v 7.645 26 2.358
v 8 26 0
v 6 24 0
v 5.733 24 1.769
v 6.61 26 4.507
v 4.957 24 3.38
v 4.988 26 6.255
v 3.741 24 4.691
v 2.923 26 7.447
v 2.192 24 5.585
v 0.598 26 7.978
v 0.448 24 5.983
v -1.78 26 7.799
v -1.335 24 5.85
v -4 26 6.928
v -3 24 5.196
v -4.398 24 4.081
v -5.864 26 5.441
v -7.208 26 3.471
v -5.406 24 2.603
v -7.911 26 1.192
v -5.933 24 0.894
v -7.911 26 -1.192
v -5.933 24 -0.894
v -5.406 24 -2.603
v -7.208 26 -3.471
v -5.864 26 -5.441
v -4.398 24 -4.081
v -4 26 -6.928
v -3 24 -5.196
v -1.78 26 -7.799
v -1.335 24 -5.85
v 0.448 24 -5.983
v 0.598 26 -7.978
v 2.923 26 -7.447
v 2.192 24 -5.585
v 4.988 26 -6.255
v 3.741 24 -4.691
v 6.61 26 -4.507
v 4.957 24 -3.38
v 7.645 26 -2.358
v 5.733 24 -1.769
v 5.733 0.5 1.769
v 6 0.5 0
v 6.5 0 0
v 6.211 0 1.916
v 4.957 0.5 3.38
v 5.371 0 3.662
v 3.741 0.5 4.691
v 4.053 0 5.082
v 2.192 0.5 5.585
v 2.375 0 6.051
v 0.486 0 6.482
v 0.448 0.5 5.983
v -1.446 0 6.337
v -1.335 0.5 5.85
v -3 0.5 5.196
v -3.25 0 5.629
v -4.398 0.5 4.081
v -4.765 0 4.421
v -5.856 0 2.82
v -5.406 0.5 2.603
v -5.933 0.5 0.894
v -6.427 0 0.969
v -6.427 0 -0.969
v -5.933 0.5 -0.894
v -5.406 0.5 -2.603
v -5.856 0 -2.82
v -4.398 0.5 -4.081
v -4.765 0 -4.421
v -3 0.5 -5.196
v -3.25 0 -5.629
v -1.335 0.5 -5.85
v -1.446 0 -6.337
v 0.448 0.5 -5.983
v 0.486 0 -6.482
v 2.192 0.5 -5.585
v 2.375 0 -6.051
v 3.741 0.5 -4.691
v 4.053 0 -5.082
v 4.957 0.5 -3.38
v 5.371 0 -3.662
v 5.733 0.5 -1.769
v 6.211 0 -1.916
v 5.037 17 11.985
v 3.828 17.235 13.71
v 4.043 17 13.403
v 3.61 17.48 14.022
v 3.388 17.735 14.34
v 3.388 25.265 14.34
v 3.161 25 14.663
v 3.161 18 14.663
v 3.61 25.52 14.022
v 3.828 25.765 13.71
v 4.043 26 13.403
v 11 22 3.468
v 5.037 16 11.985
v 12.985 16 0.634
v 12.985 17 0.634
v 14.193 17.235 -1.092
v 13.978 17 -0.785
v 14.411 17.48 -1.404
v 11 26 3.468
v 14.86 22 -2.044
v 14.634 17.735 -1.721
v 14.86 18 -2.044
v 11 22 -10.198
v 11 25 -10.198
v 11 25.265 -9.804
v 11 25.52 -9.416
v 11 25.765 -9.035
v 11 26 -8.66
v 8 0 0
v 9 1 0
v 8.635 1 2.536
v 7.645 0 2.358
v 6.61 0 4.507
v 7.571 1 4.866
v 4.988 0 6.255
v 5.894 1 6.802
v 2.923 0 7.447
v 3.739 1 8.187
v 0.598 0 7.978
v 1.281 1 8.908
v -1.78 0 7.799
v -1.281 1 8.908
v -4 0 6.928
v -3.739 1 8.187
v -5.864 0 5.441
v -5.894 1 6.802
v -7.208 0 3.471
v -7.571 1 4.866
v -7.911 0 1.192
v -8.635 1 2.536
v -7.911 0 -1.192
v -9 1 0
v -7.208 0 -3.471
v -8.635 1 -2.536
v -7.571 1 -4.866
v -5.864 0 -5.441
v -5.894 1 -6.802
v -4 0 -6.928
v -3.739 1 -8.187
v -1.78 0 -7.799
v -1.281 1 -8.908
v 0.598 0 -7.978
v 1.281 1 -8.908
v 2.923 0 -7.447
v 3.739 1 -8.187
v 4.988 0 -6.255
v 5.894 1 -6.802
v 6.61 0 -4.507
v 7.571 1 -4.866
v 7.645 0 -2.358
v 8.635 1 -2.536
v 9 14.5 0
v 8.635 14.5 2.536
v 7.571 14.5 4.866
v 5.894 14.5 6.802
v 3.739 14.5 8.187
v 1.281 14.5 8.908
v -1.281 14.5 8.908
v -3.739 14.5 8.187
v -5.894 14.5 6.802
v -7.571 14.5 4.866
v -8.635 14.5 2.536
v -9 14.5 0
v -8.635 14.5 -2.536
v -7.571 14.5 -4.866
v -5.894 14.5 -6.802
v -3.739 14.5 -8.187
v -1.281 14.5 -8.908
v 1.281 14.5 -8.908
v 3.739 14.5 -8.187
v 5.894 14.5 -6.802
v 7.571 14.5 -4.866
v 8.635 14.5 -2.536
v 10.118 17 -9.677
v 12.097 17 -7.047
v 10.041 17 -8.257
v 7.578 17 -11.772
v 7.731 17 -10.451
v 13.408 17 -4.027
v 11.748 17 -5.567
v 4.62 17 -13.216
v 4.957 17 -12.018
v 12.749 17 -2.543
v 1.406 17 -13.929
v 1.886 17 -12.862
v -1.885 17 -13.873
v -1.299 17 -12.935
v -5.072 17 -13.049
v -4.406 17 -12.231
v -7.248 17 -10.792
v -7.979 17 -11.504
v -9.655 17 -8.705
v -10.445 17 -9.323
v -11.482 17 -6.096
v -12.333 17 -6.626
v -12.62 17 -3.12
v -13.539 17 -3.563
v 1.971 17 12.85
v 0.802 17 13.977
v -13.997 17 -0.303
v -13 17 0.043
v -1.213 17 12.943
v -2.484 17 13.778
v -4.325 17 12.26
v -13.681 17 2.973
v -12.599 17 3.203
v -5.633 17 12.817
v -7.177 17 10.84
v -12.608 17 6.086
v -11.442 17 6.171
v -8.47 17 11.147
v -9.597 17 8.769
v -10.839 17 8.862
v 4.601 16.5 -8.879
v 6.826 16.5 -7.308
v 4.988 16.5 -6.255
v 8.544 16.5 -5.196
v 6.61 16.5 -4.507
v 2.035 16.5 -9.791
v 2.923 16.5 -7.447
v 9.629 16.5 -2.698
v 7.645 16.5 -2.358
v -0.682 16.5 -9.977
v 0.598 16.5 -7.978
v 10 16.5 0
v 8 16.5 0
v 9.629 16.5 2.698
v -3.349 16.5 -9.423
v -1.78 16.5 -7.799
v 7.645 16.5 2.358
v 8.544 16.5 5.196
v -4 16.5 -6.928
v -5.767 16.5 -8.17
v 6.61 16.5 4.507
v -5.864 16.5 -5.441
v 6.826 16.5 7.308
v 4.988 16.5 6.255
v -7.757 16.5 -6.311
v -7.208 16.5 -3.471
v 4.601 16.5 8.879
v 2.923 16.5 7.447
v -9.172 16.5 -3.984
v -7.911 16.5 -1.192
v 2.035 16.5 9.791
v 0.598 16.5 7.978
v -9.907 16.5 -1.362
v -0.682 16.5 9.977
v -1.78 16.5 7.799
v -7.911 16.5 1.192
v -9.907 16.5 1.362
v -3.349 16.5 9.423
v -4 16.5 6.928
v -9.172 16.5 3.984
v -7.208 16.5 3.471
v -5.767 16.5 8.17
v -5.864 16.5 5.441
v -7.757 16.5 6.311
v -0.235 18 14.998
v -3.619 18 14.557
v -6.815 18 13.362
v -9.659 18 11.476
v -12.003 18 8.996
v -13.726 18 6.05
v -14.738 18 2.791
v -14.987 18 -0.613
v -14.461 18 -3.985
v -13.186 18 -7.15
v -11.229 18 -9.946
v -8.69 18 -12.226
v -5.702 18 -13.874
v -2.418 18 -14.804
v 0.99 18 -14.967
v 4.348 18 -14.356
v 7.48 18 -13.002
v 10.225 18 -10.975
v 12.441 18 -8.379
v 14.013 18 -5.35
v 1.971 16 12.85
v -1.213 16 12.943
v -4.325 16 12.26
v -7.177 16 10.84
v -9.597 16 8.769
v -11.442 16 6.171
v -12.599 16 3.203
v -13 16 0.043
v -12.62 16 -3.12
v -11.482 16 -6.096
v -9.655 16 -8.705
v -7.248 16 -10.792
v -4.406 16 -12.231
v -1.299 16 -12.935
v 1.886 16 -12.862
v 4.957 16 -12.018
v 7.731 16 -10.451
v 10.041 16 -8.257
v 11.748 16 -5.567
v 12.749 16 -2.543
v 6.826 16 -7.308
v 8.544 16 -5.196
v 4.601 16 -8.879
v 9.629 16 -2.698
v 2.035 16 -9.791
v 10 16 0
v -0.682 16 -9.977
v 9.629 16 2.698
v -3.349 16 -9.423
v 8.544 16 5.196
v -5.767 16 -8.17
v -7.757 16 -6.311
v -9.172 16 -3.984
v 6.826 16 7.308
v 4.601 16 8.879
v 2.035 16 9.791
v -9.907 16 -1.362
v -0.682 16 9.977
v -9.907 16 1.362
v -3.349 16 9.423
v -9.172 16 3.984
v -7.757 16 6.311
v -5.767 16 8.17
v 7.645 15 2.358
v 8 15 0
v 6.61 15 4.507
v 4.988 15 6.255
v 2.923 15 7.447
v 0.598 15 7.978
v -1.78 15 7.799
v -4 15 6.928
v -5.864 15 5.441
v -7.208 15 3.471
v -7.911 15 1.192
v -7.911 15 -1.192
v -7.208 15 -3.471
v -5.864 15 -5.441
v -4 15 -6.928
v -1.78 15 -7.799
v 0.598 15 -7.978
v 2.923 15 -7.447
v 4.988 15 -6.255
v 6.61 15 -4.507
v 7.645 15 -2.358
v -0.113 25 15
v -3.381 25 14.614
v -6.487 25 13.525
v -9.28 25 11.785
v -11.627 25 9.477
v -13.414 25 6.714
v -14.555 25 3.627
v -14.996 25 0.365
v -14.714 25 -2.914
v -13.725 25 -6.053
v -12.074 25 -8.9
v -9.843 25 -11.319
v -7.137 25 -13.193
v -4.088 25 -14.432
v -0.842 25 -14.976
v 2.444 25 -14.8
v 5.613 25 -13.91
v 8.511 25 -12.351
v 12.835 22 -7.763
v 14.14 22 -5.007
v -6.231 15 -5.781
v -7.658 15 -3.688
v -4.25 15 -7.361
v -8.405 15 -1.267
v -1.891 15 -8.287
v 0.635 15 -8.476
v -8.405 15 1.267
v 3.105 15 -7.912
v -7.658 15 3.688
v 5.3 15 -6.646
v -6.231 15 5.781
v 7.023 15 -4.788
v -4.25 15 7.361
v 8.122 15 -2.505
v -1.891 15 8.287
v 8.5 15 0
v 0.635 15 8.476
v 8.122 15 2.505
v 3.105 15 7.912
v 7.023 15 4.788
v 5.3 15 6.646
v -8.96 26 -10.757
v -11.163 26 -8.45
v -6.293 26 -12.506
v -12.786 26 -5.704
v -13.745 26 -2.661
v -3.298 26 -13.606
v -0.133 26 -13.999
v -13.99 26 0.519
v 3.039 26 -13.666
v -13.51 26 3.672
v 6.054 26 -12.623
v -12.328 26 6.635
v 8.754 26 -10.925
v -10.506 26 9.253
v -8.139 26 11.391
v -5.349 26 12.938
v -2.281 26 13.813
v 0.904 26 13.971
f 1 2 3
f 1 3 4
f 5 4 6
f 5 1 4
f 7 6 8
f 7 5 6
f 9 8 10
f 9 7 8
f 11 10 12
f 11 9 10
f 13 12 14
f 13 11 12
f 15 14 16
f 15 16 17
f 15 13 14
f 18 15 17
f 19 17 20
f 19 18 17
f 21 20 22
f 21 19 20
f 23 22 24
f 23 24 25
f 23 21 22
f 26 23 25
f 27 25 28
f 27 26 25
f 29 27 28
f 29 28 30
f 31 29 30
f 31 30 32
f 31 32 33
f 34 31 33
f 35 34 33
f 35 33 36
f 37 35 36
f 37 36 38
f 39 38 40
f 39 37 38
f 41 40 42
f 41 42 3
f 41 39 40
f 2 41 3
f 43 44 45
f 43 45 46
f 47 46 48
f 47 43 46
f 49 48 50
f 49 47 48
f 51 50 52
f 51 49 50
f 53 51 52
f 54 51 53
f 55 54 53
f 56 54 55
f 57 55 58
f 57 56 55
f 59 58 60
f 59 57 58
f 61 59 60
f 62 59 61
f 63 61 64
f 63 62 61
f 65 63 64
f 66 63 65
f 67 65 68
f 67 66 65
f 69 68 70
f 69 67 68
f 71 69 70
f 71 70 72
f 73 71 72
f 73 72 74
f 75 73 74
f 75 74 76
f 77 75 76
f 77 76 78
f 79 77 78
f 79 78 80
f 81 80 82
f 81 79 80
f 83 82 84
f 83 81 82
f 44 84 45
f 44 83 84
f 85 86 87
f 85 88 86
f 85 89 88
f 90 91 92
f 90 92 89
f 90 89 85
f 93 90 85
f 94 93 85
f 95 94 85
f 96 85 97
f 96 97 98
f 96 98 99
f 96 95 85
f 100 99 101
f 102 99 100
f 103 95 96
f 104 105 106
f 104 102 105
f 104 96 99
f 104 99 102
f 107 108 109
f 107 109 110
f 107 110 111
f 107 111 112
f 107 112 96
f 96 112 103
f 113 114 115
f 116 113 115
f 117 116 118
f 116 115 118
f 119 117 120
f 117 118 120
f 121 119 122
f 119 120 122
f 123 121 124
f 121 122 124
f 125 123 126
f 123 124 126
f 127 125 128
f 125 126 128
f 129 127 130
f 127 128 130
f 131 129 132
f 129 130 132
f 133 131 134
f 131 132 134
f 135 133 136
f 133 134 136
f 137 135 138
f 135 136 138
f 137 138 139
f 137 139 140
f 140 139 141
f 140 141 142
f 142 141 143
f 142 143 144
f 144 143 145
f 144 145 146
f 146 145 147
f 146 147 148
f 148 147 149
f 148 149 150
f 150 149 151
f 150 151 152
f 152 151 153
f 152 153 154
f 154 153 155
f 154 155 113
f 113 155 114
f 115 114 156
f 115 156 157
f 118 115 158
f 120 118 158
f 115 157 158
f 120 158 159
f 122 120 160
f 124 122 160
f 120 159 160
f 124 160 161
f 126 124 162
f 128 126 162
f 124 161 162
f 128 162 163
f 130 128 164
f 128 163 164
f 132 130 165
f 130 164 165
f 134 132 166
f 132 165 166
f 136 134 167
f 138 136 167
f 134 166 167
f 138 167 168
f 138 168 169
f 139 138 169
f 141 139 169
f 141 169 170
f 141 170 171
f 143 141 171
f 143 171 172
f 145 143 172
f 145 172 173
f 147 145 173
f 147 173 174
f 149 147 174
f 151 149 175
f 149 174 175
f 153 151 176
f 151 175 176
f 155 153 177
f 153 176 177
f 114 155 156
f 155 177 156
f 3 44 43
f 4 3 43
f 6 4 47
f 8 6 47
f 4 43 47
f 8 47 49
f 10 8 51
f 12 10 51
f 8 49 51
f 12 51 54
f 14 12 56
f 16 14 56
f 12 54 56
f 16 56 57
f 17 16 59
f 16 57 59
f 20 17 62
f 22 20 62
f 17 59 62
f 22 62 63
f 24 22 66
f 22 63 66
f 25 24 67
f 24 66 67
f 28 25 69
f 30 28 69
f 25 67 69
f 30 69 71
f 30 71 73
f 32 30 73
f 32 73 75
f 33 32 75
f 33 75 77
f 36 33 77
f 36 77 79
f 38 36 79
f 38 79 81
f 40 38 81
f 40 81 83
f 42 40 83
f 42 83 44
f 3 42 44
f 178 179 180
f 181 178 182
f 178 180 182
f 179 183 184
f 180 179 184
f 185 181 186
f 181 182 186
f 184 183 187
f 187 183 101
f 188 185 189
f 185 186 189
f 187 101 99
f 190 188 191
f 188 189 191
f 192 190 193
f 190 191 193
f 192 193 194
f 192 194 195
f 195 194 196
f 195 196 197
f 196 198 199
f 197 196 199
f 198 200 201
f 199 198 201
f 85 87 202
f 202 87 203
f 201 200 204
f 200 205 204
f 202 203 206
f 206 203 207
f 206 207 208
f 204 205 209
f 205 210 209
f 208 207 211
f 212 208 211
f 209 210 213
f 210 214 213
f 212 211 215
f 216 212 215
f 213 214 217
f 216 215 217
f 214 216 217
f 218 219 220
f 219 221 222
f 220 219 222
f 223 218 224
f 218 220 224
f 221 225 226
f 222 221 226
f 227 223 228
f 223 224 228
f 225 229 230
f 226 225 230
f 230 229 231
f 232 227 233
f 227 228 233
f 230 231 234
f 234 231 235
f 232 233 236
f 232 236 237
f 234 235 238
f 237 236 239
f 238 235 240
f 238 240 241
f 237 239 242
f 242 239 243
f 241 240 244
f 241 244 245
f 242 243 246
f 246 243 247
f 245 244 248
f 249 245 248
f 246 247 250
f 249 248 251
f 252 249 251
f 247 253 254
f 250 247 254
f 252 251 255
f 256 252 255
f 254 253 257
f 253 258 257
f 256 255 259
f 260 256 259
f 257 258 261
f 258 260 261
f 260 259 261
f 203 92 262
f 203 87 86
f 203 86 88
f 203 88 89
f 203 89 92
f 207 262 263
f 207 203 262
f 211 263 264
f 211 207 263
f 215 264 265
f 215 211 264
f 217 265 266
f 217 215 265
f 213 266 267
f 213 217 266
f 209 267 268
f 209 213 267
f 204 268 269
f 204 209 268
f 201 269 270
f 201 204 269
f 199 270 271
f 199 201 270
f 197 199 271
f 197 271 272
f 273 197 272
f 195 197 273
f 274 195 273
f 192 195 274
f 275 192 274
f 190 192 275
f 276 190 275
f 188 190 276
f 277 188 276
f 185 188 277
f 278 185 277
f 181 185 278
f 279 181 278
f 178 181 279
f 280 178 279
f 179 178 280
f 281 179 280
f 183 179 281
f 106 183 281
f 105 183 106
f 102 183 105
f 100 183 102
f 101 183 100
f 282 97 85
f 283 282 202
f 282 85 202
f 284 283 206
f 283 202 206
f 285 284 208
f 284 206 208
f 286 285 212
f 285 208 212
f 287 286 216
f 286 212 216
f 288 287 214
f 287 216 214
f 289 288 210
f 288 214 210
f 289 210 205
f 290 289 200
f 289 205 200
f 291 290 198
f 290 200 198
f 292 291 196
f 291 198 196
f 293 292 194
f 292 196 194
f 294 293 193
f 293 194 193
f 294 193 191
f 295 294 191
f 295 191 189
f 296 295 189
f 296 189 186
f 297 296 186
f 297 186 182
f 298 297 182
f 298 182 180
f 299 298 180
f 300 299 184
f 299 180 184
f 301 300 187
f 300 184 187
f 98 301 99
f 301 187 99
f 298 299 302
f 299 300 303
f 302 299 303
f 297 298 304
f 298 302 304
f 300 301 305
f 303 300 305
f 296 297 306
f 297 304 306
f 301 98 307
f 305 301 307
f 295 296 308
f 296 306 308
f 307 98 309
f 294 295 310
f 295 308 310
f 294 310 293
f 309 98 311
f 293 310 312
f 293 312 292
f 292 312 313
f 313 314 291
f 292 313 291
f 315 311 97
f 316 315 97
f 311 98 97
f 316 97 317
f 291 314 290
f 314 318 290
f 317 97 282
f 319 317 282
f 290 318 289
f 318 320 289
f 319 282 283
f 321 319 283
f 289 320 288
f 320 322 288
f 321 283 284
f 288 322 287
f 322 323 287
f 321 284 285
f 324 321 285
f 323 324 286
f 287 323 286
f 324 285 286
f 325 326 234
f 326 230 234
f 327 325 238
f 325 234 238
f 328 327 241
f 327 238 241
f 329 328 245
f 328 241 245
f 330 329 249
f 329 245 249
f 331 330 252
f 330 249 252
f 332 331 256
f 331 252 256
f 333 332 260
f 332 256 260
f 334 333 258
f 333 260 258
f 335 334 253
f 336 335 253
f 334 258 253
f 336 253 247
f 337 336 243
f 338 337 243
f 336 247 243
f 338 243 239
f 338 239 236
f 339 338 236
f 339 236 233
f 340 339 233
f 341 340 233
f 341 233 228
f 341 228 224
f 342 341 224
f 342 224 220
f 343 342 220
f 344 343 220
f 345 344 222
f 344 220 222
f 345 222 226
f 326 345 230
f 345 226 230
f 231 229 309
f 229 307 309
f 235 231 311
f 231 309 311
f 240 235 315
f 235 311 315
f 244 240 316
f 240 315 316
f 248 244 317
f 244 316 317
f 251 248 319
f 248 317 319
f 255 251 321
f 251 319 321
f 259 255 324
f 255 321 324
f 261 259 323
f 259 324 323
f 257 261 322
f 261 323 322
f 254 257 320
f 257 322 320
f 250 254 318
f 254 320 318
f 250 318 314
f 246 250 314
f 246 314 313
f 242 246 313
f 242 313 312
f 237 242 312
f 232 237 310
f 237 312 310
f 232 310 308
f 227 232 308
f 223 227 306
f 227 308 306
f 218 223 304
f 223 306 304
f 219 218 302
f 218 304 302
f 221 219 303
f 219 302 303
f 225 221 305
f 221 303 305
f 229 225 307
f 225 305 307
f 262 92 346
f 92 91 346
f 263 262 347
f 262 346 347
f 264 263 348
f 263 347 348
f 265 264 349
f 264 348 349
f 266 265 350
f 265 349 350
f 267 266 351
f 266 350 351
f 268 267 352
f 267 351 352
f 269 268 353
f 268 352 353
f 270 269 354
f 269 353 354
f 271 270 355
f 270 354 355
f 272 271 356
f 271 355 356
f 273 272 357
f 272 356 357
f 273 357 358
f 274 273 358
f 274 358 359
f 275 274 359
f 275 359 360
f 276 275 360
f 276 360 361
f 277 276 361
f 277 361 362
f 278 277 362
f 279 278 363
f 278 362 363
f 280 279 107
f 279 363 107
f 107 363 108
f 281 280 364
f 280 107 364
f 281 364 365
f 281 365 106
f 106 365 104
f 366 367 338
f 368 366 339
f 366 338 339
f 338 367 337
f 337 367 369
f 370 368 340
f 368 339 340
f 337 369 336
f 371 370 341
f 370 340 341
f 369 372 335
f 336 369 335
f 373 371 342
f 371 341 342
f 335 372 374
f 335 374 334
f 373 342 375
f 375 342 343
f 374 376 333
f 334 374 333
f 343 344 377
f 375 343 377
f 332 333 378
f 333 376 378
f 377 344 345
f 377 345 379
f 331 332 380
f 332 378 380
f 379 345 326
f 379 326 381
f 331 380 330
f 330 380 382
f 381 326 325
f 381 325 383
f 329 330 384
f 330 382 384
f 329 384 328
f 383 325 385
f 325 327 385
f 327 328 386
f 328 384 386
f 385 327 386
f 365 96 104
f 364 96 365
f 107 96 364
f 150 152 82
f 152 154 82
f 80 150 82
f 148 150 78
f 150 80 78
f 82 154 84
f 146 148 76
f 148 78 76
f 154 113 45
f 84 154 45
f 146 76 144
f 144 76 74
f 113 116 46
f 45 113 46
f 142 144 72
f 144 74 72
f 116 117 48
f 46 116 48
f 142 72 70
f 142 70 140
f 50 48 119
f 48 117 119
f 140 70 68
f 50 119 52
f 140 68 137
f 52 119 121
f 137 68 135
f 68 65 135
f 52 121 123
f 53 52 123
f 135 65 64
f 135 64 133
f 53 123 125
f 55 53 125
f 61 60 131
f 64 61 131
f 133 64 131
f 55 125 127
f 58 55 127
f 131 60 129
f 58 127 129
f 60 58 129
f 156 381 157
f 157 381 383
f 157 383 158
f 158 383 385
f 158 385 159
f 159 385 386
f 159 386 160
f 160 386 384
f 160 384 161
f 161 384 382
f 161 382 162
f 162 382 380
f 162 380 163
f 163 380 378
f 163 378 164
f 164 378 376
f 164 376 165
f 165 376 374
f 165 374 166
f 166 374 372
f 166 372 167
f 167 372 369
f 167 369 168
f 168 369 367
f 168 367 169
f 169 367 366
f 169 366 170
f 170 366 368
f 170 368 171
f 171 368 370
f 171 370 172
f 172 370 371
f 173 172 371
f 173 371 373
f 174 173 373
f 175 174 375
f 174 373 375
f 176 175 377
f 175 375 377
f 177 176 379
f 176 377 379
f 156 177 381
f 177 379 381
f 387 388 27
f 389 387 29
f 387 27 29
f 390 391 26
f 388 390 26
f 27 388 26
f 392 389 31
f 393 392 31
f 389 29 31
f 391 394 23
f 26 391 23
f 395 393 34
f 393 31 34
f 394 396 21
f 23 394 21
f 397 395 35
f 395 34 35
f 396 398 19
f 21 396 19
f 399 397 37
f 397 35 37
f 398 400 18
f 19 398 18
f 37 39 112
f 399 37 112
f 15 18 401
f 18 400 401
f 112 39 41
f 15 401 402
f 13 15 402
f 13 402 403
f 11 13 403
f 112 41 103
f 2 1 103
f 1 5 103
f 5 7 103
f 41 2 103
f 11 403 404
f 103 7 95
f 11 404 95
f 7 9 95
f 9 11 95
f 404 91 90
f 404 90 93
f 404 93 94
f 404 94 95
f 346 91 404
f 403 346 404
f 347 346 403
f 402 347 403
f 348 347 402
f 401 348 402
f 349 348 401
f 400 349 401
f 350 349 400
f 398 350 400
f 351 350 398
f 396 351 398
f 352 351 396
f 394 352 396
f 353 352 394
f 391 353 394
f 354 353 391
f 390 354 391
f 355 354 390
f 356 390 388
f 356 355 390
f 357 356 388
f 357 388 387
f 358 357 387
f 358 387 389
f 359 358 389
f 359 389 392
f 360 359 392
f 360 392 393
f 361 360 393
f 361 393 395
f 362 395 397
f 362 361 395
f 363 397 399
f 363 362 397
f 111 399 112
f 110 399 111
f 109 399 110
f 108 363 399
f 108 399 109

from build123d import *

# Parameters (mm, degrees)
SKETCH_2_R          = 6
CUT_EXTRUDE_1_DEPTH = 27
CUT_EXTRUDE_2_DEPTH = 4
CHAMFER_2_SIZE      = 2
CHAMFER_3_SIZE      = 1
CHAMFER_4_SIZE      = 0.5
CUT_EXTRUDE_3_DEPTH = 10


with BuildPart() as part:
    # 草图1 → 旋转1 (revolve)
    with BuildSketch(Plane.XY):
        Polygon((0, 0), (9, 0), (9, 15), (8, 15), (8, 16), (8, 16.5), (10, 16.5), (10, 16), (13, 16), (13, 17), (15, 17), (15, 26), (0, 26), align=None)
    revolve(axis=Axis((0, 26, 0), (0, -1, 0)))

    # 草图2 → 切除-拉伸1 (cut, through all)
    with BuildSketch(Plane.XZ):
        Circle(SKETCH_2_R)
    extrude(amount=-CUT_EXTRUDE_1_DEPTH, mode=Mode.SUBTRACT)

    # 草图3 → 切除-拉伸2 (cut)
    with BuildSketch(Plane(origin=(0, 26, 0), x_dir=(1, 0, 0), z_dir=(0, 1, 0))):
        with BuildLine():
            Line((11, 10.198039027), (11, -10.198039027))
            ThreePointArc((11, -10.198039027), (15, 0), (11, 10.198039027))
        make_face()
    extrude(amount=-CUT_EXTRUDE_2_DEPTH, mode=Mode.SUBTRACT)

    # 倒角2
    chamfer_2_edges = [part.edges().sort_by_distance(p)[0] for p in [
        (-6, 26, 0),
    ]]
    chamfer(chamfer_2_edges, length=CHAMFER_2_SIZE)

    # 倒角3
    chamfer_3_edges = [part.edges().sort_by_distance(p)[0] for p in [
        (-9, 0, 0),
        (-15, 17, 0),
        (-15, 26, 0),
    ]]
    chamfer(chamfer_3_edges, length=CHAMFER_3_SIZE)

    # 倒角4
    chamfer_4_edges = [part.edges().sort_by_distance(p)[0] for p in [
        (-9, 15, 0),
        (-6, 0, 0),
    ]]
    chamfer(chamfer_4_edges, length=CHAMFER_4_SIZE)

    # 草图4 → 切除-拉伸3 (cut)
    with BuildSketch(Plane(origin=(0, 26, 0), x_dir=(1, 0, 0), z_dir=(0, 1, 0))):
        with BuildLine():
            Line((3.161317604, -14.663085317), (14.86002737, 2.044403717))
            ThreePointArc((14.86002737, 2.044403717), (14.305754261, -4.510586993), (11, -10.198039027))
            ThreePointArc((11, -10.198039027), (7.424276979, -13.033806479), (3.161317604, -14.663085317))
        make_face()
    extrude(amount=-CUT_EXTRUDE_3_DEPTH, mode=Mode.SUBTRACT)


solid = part.part
